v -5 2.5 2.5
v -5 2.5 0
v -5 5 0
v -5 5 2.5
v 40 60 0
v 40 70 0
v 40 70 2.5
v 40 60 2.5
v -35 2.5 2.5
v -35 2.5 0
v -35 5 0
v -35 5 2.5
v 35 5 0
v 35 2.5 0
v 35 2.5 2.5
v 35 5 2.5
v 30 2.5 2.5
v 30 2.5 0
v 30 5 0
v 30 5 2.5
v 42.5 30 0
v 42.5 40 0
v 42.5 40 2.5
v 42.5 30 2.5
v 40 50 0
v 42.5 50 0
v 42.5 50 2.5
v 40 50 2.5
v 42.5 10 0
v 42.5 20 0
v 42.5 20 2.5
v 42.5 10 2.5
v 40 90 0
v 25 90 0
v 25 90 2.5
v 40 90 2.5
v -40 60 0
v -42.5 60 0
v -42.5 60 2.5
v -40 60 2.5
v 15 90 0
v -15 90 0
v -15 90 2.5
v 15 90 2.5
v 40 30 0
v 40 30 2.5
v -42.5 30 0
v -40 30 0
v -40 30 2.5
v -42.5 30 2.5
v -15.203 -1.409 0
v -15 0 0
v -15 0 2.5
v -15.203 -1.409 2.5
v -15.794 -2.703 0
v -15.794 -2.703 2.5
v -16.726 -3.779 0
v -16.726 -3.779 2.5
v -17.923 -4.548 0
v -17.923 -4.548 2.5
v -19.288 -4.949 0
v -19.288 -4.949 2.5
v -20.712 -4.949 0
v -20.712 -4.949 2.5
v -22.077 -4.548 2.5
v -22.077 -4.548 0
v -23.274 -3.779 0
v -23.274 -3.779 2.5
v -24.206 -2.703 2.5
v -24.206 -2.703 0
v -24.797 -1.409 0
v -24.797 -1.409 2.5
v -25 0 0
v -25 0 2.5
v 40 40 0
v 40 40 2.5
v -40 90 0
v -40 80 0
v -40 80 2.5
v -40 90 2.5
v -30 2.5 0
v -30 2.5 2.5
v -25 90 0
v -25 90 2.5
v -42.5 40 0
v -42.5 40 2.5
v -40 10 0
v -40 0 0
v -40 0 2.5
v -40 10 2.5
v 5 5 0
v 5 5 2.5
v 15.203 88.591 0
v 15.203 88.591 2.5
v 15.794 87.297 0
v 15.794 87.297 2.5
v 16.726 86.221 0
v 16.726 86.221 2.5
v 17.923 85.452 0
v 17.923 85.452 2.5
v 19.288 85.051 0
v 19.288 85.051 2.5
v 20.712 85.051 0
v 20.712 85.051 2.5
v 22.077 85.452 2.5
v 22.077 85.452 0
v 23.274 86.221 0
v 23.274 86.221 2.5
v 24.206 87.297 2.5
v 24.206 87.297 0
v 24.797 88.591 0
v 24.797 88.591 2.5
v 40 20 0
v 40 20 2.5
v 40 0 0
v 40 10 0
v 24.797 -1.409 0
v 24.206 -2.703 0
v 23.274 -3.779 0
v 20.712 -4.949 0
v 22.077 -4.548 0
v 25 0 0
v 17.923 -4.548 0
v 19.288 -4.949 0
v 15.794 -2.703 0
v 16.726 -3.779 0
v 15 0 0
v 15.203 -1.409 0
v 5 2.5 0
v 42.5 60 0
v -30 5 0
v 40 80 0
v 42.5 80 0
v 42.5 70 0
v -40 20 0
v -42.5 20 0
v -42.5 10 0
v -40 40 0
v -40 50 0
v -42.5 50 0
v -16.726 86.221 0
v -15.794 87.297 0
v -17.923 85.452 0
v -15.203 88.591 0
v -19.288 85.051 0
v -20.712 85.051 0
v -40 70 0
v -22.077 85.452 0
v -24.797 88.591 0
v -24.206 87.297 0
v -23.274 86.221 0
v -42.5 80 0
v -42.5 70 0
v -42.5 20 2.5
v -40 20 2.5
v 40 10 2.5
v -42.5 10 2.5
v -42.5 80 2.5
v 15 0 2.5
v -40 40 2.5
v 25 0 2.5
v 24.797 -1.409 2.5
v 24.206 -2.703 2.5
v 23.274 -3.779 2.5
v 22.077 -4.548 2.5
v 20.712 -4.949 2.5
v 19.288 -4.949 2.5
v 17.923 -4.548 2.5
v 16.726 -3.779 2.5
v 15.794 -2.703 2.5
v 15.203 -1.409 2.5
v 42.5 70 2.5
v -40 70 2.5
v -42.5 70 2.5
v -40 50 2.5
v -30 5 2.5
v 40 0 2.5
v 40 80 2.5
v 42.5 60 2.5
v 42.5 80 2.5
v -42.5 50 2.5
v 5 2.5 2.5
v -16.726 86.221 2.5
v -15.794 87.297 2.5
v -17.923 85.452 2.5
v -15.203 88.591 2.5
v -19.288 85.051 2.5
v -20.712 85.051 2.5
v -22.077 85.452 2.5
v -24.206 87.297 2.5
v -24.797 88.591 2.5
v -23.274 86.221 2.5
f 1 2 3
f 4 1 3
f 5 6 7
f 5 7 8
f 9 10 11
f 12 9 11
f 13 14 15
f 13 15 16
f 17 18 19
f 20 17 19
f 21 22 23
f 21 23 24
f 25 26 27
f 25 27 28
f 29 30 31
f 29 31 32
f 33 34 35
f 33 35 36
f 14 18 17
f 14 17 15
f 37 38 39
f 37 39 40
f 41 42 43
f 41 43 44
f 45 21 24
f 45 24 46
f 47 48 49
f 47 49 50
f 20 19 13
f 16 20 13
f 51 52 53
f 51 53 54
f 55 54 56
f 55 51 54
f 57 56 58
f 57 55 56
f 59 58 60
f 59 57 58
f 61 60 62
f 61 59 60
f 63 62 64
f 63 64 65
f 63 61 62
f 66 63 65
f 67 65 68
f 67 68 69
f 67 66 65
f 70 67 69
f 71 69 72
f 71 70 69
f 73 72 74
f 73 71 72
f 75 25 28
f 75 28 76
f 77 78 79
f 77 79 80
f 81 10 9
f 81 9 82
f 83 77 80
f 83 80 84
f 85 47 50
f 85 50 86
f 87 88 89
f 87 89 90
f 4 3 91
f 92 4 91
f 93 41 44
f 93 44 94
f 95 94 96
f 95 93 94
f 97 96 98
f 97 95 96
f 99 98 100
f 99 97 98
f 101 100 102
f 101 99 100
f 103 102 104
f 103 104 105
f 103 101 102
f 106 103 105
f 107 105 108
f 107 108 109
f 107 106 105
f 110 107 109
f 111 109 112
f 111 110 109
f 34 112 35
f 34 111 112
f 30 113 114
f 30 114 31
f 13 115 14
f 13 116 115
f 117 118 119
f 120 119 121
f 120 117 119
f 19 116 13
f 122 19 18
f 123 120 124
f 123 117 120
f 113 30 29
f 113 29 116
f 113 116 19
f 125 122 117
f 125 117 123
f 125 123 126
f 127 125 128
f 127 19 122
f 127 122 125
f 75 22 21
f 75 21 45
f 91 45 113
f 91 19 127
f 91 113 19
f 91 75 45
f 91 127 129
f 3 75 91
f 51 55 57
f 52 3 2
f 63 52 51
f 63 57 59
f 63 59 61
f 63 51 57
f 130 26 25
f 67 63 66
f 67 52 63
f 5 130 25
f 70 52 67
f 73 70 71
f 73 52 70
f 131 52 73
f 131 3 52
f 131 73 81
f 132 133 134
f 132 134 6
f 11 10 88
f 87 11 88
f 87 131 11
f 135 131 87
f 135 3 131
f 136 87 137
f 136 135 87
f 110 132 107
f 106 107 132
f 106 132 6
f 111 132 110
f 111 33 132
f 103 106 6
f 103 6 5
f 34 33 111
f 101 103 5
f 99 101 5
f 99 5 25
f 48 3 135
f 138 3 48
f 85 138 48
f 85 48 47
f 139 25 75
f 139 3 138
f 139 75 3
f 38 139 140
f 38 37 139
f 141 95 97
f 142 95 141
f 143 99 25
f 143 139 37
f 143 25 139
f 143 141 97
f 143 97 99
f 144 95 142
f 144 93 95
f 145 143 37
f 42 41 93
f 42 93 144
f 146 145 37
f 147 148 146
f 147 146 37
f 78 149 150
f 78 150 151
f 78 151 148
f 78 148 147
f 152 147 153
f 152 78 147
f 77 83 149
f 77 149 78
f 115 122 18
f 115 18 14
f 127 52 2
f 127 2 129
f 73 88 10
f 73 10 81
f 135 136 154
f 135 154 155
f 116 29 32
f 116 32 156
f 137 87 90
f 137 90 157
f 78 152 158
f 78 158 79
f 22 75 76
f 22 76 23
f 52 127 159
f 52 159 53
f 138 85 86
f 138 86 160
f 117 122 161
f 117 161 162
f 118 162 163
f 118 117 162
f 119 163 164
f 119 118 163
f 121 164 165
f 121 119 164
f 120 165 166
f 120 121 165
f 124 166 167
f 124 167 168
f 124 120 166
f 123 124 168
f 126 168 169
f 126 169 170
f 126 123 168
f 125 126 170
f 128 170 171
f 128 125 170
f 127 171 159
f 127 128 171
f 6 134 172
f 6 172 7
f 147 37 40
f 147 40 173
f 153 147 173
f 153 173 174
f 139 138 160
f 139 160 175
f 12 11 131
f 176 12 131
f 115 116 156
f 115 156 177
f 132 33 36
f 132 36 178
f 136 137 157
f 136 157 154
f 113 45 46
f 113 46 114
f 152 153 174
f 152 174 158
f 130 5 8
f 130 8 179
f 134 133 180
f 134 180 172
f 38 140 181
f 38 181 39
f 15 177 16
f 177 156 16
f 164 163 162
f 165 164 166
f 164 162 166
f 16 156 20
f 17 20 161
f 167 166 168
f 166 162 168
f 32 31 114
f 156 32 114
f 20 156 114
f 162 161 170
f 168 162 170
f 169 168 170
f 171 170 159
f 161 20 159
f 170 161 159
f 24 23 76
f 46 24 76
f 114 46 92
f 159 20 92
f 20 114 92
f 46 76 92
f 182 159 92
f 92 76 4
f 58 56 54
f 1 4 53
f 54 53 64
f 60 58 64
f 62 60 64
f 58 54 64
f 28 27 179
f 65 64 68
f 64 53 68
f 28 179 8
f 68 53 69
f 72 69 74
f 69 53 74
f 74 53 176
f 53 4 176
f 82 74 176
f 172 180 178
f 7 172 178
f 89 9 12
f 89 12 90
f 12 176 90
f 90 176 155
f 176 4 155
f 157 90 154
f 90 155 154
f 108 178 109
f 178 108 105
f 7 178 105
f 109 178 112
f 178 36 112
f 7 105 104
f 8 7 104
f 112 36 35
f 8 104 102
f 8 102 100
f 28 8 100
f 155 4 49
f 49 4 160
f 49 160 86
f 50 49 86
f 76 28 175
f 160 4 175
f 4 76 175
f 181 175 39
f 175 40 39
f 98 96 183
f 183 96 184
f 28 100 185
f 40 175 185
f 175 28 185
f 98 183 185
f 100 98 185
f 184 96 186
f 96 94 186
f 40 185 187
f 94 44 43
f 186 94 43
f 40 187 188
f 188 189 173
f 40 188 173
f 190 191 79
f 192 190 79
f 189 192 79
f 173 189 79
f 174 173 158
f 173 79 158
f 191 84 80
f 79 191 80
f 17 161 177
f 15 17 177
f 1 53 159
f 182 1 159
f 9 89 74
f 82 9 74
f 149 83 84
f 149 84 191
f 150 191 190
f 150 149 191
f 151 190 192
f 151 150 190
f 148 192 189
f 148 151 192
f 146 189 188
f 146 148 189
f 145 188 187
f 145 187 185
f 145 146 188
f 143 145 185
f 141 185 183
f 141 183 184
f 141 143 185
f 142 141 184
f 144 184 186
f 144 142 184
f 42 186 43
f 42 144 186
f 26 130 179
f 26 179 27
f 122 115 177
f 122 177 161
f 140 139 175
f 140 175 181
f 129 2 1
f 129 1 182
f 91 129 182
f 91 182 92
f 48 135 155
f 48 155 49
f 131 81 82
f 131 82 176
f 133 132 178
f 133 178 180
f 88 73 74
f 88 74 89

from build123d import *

# Parameters (mm, degrees)
SKETCH1_W           = 10
SKETCH1_H           = 2.5
SKETCH1_W_2         = 5
BOSS_EXTRUDE1_DEPTH = 2.5


with BuildPart() as part:
    # Sketch1 → Boss-Extrude1 (new body)
    with BuildSketch(Plane.XY):
        with BuildLine():
            Line((42.5, 60), (42.5, 50))
            Line((42.5, 50), (40, 50))
            Line((40, 50), (40, 40))
            Line((40, 40), (42.5, 40))
            Line((42.5, 40), (42.5, 30))
            Line((42.5, 30), (40, 30))
            Line((40, 30), (40, 20))
            Line((40, 20), (42.5, 20))
            Line((42.5, 20), (42.5, 10))
            Line((42.5, 10), (40, 10))
            Line((40, 10), (40, 0))
            Line((40, 0), (25, 0))
            ThreePointArc((25, 0), (20, -5), (15, 0))
            Line((15, 0), (-15, 0))
            ThreePointArc((-15, 0), (-20, -5), (-25, 0))
            Line((-25, 0), (-40, 0))
            Line((-40, 0), (-40, 10))
            Line((-40, 10), (-42.5, 10))
            Line((-42.5, 10), (-42.5, 20))
            Line((-42.5, 20), (-40, 20))
            Line((-40, 20), (-40, 30))
            Line((-40, 30), (-42.5, 30))
            Line((-42.5, 30), (-42.5, 40))
            Line((-42.5, 40), (-40, 40))
            Line((-40, 40), (-40, 50))
            Line((-40, 50), (-42.5, 50))
            Line((-42.5, 50), (-42.5, 60))
            Line((-42.5, 60), (-40, 60))
            Line((-40, 60), (-40, 70))
            Line((-40, 70), (-42.5, 70))
            Line((-42.5, 70), (-42.5, 80))
            Line((-42.5, 80), (-40, 80))
            Line((-40, 80), (-40, 90))
            Line((-40, 90), (-25, 90))
            ThreePointArc((-25, 90), (-20, 85), (-15, 90))
            Line((-15, 90), (15, 90))
            ThreePointArc((15, 90), (20, 85), (25, 90))
            Line((25, 90), (40, 90))
            Line((40, 90), (40, 80))
            Line((40, 80), (42.5, 80))
            Line((42.5, 80), (42.5, 70))
            Line((42.5, 70), (40, 70))
            Line((40, 70), (40, 60))
            Line((40, 60), (42.5, 60))
        make_face()
        with Locations((0, 3.75)):
            Rectangle(SKETCH1_W, SKETCH1_H, mode=Mode.SUBTRACT)
        with Locations((32.5, 3.75)):
            Rectangle(SKETCH1_W_2, SKETCH1_H, mode=Mode.SUBTRACT)
        with Locations((-32.5, 3.75)):
            Rectangle(SKETCH1_W_2, SKETCH1_H, mode=Mode.SUBTRACT)
    extrude(amount=BOSS_EXTRUDE1_DEPTH)


solid = part.part
